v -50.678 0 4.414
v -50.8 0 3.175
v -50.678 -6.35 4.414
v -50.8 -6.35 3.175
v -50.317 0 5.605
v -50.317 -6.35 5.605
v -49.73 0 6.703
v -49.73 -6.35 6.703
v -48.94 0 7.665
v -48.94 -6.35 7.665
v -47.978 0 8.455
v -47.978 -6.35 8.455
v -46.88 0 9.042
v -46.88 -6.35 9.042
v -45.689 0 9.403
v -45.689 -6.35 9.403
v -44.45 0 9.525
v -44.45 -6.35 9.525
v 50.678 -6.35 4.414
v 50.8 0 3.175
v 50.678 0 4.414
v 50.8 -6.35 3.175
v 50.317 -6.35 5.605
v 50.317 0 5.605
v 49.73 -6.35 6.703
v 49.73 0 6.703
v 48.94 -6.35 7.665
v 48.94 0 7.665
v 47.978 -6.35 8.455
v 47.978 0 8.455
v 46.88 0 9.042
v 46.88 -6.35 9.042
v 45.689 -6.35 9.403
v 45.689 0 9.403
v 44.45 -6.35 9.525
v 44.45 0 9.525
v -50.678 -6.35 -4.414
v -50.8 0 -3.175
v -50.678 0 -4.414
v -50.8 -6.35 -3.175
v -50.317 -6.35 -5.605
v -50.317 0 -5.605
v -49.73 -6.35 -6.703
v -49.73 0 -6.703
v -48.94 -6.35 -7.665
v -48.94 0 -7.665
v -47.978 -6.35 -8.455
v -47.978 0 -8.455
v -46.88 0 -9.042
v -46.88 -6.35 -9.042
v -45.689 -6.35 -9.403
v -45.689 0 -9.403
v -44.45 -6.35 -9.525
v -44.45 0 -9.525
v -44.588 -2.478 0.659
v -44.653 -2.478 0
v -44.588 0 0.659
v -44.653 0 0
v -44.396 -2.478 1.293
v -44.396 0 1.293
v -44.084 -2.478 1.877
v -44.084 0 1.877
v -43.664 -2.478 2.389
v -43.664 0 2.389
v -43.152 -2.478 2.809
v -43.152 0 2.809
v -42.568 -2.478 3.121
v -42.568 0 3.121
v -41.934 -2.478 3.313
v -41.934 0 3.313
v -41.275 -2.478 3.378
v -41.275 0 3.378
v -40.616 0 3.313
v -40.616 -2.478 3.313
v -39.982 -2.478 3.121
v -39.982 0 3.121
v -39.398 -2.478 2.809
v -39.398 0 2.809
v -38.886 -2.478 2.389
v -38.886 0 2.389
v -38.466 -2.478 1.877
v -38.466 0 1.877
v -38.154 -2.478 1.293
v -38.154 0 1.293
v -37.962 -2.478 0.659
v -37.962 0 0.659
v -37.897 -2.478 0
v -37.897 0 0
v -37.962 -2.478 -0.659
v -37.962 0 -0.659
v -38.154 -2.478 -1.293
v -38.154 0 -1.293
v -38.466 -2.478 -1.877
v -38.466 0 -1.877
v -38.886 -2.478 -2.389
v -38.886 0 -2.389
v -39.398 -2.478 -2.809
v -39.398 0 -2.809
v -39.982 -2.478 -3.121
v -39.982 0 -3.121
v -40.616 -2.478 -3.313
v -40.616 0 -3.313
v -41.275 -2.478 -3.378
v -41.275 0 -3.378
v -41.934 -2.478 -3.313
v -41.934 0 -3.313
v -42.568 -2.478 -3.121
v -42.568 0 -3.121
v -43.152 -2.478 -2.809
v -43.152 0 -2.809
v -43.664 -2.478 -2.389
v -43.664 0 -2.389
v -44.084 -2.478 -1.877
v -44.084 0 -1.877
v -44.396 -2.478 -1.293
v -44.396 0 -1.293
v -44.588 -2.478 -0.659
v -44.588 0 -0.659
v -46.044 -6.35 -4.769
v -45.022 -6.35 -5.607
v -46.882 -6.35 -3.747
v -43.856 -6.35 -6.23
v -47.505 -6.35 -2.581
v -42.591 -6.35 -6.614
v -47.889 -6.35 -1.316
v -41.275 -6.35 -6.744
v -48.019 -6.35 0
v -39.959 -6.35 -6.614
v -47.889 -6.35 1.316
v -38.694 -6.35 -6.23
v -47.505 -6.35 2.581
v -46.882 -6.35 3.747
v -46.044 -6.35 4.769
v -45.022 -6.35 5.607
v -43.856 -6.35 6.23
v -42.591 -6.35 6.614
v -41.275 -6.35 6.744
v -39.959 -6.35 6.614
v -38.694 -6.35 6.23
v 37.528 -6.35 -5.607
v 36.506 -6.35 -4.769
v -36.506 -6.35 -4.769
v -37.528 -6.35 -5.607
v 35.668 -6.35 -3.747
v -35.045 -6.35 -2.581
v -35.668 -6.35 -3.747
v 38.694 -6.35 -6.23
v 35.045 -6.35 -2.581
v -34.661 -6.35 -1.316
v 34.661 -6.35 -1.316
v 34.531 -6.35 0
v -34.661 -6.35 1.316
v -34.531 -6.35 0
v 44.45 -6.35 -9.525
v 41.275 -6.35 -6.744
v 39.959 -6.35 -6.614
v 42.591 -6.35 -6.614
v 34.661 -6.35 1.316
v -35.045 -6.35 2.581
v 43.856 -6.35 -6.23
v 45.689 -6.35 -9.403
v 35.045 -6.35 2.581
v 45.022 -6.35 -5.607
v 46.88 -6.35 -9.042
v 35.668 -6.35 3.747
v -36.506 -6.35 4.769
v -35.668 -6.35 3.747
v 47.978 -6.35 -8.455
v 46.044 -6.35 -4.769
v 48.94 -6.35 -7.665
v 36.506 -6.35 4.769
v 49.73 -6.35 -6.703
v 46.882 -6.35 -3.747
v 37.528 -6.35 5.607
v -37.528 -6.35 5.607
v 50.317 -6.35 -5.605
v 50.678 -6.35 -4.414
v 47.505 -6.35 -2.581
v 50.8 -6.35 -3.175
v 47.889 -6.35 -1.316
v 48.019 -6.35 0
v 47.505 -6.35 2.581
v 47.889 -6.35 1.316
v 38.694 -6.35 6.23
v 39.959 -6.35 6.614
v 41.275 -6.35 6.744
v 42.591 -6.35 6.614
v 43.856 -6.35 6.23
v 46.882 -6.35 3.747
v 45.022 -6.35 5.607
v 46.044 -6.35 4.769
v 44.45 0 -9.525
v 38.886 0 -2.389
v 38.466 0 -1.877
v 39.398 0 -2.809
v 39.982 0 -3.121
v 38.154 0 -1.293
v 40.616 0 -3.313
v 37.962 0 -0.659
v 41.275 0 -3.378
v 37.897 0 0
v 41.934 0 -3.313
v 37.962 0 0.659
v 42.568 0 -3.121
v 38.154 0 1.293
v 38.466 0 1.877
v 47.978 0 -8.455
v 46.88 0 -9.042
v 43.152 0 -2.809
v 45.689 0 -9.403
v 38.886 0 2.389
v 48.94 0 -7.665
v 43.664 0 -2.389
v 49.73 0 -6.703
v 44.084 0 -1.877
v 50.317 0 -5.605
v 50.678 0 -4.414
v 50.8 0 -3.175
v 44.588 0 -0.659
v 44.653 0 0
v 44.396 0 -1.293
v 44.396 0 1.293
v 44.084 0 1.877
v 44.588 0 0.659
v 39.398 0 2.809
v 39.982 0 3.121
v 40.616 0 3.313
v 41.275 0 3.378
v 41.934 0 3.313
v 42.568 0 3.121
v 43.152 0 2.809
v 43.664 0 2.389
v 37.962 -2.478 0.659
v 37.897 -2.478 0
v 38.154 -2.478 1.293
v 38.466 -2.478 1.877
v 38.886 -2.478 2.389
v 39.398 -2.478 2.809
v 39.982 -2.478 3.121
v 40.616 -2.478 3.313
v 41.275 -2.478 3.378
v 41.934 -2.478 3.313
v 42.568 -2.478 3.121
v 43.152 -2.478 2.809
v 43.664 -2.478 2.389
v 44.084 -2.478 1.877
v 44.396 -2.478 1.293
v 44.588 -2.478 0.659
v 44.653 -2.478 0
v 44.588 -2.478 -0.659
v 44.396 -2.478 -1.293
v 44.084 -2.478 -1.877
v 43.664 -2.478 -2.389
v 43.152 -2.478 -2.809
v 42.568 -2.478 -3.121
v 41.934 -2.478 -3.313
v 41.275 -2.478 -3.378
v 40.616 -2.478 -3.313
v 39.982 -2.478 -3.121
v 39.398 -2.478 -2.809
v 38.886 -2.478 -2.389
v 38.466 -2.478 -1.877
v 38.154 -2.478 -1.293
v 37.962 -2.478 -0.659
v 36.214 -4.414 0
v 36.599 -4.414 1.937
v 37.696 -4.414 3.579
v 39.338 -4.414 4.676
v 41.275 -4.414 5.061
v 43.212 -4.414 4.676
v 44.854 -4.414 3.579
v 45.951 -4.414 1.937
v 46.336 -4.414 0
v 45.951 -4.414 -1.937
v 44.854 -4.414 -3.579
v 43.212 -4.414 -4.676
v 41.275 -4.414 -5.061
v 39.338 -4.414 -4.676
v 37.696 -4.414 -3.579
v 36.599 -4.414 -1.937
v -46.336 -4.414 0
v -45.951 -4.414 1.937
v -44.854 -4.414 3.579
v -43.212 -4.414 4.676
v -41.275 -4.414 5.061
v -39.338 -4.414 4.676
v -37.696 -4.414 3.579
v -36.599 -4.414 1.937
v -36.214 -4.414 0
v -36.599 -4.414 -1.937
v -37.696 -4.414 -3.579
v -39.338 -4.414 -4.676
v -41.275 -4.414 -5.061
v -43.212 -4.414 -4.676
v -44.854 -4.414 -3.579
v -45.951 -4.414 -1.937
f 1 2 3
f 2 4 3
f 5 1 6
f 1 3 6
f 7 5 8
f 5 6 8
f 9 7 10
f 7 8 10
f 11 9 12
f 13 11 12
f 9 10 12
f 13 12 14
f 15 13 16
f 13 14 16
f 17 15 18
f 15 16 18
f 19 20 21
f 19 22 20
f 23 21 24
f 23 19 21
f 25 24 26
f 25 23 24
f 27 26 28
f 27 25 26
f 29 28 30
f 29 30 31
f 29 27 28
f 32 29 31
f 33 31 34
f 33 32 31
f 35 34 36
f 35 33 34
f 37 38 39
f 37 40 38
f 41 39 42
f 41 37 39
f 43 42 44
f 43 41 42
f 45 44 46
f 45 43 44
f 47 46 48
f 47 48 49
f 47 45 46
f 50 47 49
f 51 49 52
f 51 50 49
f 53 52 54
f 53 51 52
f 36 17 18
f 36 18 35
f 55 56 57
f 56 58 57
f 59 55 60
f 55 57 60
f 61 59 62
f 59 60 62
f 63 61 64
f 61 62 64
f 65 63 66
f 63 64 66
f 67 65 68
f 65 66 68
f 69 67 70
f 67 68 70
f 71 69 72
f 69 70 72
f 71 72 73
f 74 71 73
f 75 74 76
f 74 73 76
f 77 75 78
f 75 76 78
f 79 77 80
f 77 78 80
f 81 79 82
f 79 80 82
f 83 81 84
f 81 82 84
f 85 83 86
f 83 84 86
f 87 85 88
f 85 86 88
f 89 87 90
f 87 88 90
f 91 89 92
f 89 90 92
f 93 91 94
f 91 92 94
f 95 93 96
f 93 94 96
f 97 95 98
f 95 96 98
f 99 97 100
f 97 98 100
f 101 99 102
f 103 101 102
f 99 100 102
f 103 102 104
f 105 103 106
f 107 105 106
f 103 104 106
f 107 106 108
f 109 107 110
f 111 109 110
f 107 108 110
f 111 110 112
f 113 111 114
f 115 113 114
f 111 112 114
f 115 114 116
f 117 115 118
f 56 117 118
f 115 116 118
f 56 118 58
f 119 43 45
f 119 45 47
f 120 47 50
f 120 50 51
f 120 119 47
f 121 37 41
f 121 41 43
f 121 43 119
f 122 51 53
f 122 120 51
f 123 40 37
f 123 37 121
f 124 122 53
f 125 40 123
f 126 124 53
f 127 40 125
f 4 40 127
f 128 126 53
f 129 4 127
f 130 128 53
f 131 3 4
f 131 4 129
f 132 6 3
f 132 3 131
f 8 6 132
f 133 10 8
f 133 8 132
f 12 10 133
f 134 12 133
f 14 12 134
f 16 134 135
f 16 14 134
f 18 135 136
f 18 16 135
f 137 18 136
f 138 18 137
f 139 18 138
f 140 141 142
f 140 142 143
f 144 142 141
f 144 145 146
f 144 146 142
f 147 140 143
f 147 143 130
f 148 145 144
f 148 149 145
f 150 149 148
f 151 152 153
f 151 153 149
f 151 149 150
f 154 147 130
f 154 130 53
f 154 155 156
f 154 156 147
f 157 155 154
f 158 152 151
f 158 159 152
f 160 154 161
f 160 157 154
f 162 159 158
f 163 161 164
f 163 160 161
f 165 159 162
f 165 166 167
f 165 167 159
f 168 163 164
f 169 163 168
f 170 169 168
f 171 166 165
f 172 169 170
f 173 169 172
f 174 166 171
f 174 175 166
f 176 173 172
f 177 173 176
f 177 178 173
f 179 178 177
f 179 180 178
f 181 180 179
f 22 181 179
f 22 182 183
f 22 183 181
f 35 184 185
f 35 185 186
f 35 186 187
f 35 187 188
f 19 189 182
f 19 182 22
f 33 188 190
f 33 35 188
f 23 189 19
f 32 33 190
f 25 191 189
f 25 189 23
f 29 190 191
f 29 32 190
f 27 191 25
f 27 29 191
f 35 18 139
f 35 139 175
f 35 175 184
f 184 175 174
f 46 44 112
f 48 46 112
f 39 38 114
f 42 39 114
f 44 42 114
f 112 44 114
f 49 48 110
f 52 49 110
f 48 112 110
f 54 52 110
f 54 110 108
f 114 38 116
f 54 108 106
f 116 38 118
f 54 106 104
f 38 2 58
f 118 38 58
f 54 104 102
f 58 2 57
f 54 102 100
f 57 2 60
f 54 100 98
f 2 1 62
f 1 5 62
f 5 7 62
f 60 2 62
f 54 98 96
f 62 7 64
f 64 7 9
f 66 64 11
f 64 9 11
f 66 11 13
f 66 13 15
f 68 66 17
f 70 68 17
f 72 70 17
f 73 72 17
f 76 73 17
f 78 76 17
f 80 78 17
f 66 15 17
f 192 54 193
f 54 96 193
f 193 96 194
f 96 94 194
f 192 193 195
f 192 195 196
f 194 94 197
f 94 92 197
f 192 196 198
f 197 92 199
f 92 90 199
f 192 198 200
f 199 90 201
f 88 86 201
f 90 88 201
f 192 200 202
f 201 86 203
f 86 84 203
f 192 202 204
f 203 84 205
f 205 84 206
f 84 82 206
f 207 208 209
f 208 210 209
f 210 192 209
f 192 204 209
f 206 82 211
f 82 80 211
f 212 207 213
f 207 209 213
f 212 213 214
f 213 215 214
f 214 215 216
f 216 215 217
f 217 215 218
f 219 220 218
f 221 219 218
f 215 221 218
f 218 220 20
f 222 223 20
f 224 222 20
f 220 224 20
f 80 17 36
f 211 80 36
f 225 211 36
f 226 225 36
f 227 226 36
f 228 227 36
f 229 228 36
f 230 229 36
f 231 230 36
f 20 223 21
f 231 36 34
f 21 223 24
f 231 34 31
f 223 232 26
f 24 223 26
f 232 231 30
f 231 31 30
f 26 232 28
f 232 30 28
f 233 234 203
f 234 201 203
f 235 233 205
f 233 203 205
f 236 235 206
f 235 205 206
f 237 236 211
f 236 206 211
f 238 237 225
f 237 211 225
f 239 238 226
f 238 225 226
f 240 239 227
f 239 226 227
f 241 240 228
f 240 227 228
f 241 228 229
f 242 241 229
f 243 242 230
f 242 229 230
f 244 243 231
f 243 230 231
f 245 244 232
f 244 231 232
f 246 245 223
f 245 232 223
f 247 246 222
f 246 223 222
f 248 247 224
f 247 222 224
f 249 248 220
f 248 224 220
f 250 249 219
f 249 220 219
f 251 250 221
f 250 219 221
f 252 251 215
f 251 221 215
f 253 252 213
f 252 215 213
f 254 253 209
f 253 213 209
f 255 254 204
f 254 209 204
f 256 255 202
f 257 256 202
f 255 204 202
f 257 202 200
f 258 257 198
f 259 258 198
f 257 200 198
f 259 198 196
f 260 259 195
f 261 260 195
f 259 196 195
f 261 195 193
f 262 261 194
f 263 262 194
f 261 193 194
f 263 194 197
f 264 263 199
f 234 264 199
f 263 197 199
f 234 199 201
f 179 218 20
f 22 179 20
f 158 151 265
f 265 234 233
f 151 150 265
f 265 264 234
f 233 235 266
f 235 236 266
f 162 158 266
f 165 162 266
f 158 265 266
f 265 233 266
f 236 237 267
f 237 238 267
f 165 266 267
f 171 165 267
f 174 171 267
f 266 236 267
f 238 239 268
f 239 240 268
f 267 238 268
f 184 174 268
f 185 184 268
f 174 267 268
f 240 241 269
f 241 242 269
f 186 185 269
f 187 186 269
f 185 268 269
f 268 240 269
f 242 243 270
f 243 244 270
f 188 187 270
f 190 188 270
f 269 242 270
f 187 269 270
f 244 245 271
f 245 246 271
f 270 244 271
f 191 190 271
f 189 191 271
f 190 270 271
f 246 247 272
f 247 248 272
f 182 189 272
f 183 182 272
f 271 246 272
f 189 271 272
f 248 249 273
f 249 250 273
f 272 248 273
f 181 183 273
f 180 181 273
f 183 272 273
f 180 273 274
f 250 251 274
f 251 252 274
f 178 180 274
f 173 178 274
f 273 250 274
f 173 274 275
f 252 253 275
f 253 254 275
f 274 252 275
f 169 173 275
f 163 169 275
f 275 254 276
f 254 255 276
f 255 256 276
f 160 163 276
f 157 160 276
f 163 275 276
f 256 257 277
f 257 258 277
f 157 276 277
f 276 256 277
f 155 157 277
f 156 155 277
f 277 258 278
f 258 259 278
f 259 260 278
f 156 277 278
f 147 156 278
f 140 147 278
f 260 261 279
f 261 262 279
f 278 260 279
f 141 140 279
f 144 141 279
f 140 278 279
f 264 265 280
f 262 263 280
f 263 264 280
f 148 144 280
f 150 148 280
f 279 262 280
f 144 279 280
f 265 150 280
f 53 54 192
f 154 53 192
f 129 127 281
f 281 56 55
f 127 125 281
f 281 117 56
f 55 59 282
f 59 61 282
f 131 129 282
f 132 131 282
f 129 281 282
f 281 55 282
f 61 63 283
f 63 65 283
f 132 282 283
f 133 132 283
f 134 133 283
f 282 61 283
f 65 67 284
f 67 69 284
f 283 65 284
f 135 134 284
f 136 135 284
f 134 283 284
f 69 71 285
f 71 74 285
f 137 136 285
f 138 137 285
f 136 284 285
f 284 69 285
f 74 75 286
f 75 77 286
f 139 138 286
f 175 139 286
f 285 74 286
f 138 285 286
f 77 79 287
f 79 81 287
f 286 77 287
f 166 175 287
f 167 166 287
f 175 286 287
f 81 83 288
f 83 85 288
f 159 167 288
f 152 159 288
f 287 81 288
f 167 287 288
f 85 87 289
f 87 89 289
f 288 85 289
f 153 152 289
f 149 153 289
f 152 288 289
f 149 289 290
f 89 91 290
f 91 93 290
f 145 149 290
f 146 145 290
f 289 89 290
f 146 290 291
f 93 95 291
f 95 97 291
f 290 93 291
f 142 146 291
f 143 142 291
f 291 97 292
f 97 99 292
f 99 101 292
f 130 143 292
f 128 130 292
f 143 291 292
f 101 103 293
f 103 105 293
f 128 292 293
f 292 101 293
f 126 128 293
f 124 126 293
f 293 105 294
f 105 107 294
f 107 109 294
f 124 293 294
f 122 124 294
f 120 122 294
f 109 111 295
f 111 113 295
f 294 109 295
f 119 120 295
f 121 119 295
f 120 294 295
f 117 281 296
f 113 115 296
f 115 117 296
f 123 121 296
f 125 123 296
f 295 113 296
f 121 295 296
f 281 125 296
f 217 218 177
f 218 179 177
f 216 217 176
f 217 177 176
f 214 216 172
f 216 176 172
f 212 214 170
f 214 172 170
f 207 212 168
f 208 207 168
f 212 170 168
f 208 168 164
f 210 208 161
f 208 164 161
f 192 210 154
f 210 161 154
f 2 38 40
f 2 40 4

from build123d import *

# Parameters (mm, degrees)
F0_W           = 101.6
F0_H           = 19.05
F1_DEPTH       = 6.35
F3_D           = 6.7564
F3_CSINK_D     = 13.4874
F3_CSINK_ANGLE = 82
F4_R           = 6.35


with BuildPart() as f1:
    # F0 (on Front) → F1 (new body)
    with BuildSketch(Plane.XZ):
        Rectangle(F0_W, F0_H)
    extrude(amount=F1_DEPTH)

    # F3 (through all)
    with Locations(Plane.XZ.offset(6.35)):
        with Locations((-41.275, 0), (41.275, 0)):
            CounterSinkHole(F3_D / 2, F3_CSINK_D / 2, counter_sink_angle=F3_CSINK_ANGLE)

    # F4
    f4_edges = [f1.edges().sort_by_distance(p)[0] for p in [
        (-50.8, -3.175, 9.525),
        (-50.8, -3.175, -9.525),
        (50.8, -3.175, -9.525),
        (50.8, -3.175, 9.525),
    ]]
    fillet(f4_edges, radius=F4_R)


solid = f1.part
